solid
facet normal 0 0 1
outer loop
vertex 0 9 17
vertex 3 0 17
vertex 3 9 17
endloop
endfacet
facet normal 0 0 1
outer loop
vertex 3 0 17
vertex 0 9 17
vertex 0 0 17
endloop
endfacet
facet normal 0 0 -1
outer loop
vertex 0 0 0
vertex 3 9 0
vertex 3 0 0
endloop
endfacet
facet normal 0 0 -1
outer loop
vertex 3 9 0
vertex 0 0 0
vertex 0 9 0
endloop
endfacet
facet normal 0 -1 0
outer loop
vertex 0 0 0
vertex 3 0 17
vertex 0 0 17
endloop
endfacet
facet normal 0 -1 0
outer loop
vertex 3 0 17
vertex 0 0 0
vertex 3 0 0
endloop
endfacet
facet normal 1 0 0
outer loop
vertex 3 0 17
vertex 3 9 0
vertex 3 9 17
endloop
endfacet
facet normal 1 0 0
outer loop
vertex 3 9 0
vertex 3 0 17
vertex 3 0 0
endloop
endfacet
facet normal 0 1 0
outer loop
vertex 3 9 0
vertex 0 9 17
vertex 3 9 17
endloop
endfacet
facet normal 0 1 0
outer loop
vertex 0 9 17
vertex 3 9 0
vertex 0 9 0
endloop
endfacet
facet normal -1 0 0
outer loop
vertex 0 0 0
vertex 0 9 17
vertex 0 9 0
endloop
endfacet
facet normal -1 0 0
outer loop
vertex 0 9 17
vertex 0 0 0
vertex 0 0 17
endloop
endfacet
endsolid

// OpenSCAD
// Generated by SolidPython 1.0.1 on 2020-07-29 00:39:26


cube(size = [3, 9, 17]);
/***********************************************
*********      SolidPython code:      **********
************************************************
 
# import packages: SolidPython
from solid import *
from solid.utils import *
from itertools import chain, combinations


class Resize:

    def __init__(self, scad_file):
        self.scad_file = scad_file
        #self.scad_file = import_scad(scad_file)
        # cone/cylinder param:
        self.r1 = 0
        self.r2 = 0
        self.h = 0
        # rectangular prism param:
        self.w = 0
        self.l = 0
        # ellipse param:
        self.r = 0

    # import OpenScad code (file name corresponds to shape)


    # classify shape + parameters
    def assign(self, param1, param2, param3):
        if self.scad_file == 'cone.scad':
            self.r1 = param1
            self.r2 = param2
            self.h = param3
        elif self.scad_file == 'cylinder.scad':
            self.r1 = param1
            self.r2 = param2
            self.h = param3
        elif self.scad_file == 'rectangularPrism.scad':
            self.h = param1
            self.l = param2
            self.w = param3
        else:
            self.r = param1
            self.h = param2

    # resize parameters
    def iterate(self):
        x = range(3, 20, 2)
        i = 1
        if self.scad_file == 'cone.scad':
            tempList = list(combinations(x, 2))
            for temp in tempList:
                param1 = temp[0]
                param2 = temp[1]
                filepath = 'produced_scad_files/' + 'cone' + str(param1) + '_' + str(param2) + '_' + '.scad'
                scad_render_to_file(cylinder(h=param1, r1=param2, r2=0), filepath)

        elif self.scad_file == 'cylinder.scad':
            tempList = list(combinations(x, 3))
            for temp in tempList:
                param1 = temp[0]
                param2 = temp[1]
                filepath = 'produced_scad_files/' + 'cylinder' + str(param1) + '_' + str(param2) + '_' + '.scad'
                scad_render_to_file(cylinder(h=param1, r1=param2, r2=param2), filepath)

        elif self.scad_file == 'rectangularPrism.scad':
            tempList = list(combinations(x, 3))
            for temp in tempList:
                param1 = temp[0]
                param2 = temp[1]
                param3 = temp[2]
                filepath = 'produced_scad_files/' + 'rectangularPrism' + str(param1) + '_' + str(param2) + '_' + str(
                    param3) + '.scad'
                scad_render_to_file(cube(size=(param1, param2, param3)), filepath)

        elif self.scad_file == 'ellipse.scad':
            tempList = list(combinations(x, 4))
            for temp in tempList:
                param1 = temp[0]
                param2 = temp[1]
                param3 = temp[2]
                param4 = temp[3]
                filepath = 'produced_scad_files/' + 'ellipse' + str(param1) + '_' + str(param2) + '_' + str(param3) + '_' + str(param4) + '.scad'
                scad_render_to_file(scale([param1, param2, param3])(sphere(r=param4)), filepath)

    def render_to_scadfile(self):
        scad_render_to_file(scad, 'example.scad') 
 
************************************************/
